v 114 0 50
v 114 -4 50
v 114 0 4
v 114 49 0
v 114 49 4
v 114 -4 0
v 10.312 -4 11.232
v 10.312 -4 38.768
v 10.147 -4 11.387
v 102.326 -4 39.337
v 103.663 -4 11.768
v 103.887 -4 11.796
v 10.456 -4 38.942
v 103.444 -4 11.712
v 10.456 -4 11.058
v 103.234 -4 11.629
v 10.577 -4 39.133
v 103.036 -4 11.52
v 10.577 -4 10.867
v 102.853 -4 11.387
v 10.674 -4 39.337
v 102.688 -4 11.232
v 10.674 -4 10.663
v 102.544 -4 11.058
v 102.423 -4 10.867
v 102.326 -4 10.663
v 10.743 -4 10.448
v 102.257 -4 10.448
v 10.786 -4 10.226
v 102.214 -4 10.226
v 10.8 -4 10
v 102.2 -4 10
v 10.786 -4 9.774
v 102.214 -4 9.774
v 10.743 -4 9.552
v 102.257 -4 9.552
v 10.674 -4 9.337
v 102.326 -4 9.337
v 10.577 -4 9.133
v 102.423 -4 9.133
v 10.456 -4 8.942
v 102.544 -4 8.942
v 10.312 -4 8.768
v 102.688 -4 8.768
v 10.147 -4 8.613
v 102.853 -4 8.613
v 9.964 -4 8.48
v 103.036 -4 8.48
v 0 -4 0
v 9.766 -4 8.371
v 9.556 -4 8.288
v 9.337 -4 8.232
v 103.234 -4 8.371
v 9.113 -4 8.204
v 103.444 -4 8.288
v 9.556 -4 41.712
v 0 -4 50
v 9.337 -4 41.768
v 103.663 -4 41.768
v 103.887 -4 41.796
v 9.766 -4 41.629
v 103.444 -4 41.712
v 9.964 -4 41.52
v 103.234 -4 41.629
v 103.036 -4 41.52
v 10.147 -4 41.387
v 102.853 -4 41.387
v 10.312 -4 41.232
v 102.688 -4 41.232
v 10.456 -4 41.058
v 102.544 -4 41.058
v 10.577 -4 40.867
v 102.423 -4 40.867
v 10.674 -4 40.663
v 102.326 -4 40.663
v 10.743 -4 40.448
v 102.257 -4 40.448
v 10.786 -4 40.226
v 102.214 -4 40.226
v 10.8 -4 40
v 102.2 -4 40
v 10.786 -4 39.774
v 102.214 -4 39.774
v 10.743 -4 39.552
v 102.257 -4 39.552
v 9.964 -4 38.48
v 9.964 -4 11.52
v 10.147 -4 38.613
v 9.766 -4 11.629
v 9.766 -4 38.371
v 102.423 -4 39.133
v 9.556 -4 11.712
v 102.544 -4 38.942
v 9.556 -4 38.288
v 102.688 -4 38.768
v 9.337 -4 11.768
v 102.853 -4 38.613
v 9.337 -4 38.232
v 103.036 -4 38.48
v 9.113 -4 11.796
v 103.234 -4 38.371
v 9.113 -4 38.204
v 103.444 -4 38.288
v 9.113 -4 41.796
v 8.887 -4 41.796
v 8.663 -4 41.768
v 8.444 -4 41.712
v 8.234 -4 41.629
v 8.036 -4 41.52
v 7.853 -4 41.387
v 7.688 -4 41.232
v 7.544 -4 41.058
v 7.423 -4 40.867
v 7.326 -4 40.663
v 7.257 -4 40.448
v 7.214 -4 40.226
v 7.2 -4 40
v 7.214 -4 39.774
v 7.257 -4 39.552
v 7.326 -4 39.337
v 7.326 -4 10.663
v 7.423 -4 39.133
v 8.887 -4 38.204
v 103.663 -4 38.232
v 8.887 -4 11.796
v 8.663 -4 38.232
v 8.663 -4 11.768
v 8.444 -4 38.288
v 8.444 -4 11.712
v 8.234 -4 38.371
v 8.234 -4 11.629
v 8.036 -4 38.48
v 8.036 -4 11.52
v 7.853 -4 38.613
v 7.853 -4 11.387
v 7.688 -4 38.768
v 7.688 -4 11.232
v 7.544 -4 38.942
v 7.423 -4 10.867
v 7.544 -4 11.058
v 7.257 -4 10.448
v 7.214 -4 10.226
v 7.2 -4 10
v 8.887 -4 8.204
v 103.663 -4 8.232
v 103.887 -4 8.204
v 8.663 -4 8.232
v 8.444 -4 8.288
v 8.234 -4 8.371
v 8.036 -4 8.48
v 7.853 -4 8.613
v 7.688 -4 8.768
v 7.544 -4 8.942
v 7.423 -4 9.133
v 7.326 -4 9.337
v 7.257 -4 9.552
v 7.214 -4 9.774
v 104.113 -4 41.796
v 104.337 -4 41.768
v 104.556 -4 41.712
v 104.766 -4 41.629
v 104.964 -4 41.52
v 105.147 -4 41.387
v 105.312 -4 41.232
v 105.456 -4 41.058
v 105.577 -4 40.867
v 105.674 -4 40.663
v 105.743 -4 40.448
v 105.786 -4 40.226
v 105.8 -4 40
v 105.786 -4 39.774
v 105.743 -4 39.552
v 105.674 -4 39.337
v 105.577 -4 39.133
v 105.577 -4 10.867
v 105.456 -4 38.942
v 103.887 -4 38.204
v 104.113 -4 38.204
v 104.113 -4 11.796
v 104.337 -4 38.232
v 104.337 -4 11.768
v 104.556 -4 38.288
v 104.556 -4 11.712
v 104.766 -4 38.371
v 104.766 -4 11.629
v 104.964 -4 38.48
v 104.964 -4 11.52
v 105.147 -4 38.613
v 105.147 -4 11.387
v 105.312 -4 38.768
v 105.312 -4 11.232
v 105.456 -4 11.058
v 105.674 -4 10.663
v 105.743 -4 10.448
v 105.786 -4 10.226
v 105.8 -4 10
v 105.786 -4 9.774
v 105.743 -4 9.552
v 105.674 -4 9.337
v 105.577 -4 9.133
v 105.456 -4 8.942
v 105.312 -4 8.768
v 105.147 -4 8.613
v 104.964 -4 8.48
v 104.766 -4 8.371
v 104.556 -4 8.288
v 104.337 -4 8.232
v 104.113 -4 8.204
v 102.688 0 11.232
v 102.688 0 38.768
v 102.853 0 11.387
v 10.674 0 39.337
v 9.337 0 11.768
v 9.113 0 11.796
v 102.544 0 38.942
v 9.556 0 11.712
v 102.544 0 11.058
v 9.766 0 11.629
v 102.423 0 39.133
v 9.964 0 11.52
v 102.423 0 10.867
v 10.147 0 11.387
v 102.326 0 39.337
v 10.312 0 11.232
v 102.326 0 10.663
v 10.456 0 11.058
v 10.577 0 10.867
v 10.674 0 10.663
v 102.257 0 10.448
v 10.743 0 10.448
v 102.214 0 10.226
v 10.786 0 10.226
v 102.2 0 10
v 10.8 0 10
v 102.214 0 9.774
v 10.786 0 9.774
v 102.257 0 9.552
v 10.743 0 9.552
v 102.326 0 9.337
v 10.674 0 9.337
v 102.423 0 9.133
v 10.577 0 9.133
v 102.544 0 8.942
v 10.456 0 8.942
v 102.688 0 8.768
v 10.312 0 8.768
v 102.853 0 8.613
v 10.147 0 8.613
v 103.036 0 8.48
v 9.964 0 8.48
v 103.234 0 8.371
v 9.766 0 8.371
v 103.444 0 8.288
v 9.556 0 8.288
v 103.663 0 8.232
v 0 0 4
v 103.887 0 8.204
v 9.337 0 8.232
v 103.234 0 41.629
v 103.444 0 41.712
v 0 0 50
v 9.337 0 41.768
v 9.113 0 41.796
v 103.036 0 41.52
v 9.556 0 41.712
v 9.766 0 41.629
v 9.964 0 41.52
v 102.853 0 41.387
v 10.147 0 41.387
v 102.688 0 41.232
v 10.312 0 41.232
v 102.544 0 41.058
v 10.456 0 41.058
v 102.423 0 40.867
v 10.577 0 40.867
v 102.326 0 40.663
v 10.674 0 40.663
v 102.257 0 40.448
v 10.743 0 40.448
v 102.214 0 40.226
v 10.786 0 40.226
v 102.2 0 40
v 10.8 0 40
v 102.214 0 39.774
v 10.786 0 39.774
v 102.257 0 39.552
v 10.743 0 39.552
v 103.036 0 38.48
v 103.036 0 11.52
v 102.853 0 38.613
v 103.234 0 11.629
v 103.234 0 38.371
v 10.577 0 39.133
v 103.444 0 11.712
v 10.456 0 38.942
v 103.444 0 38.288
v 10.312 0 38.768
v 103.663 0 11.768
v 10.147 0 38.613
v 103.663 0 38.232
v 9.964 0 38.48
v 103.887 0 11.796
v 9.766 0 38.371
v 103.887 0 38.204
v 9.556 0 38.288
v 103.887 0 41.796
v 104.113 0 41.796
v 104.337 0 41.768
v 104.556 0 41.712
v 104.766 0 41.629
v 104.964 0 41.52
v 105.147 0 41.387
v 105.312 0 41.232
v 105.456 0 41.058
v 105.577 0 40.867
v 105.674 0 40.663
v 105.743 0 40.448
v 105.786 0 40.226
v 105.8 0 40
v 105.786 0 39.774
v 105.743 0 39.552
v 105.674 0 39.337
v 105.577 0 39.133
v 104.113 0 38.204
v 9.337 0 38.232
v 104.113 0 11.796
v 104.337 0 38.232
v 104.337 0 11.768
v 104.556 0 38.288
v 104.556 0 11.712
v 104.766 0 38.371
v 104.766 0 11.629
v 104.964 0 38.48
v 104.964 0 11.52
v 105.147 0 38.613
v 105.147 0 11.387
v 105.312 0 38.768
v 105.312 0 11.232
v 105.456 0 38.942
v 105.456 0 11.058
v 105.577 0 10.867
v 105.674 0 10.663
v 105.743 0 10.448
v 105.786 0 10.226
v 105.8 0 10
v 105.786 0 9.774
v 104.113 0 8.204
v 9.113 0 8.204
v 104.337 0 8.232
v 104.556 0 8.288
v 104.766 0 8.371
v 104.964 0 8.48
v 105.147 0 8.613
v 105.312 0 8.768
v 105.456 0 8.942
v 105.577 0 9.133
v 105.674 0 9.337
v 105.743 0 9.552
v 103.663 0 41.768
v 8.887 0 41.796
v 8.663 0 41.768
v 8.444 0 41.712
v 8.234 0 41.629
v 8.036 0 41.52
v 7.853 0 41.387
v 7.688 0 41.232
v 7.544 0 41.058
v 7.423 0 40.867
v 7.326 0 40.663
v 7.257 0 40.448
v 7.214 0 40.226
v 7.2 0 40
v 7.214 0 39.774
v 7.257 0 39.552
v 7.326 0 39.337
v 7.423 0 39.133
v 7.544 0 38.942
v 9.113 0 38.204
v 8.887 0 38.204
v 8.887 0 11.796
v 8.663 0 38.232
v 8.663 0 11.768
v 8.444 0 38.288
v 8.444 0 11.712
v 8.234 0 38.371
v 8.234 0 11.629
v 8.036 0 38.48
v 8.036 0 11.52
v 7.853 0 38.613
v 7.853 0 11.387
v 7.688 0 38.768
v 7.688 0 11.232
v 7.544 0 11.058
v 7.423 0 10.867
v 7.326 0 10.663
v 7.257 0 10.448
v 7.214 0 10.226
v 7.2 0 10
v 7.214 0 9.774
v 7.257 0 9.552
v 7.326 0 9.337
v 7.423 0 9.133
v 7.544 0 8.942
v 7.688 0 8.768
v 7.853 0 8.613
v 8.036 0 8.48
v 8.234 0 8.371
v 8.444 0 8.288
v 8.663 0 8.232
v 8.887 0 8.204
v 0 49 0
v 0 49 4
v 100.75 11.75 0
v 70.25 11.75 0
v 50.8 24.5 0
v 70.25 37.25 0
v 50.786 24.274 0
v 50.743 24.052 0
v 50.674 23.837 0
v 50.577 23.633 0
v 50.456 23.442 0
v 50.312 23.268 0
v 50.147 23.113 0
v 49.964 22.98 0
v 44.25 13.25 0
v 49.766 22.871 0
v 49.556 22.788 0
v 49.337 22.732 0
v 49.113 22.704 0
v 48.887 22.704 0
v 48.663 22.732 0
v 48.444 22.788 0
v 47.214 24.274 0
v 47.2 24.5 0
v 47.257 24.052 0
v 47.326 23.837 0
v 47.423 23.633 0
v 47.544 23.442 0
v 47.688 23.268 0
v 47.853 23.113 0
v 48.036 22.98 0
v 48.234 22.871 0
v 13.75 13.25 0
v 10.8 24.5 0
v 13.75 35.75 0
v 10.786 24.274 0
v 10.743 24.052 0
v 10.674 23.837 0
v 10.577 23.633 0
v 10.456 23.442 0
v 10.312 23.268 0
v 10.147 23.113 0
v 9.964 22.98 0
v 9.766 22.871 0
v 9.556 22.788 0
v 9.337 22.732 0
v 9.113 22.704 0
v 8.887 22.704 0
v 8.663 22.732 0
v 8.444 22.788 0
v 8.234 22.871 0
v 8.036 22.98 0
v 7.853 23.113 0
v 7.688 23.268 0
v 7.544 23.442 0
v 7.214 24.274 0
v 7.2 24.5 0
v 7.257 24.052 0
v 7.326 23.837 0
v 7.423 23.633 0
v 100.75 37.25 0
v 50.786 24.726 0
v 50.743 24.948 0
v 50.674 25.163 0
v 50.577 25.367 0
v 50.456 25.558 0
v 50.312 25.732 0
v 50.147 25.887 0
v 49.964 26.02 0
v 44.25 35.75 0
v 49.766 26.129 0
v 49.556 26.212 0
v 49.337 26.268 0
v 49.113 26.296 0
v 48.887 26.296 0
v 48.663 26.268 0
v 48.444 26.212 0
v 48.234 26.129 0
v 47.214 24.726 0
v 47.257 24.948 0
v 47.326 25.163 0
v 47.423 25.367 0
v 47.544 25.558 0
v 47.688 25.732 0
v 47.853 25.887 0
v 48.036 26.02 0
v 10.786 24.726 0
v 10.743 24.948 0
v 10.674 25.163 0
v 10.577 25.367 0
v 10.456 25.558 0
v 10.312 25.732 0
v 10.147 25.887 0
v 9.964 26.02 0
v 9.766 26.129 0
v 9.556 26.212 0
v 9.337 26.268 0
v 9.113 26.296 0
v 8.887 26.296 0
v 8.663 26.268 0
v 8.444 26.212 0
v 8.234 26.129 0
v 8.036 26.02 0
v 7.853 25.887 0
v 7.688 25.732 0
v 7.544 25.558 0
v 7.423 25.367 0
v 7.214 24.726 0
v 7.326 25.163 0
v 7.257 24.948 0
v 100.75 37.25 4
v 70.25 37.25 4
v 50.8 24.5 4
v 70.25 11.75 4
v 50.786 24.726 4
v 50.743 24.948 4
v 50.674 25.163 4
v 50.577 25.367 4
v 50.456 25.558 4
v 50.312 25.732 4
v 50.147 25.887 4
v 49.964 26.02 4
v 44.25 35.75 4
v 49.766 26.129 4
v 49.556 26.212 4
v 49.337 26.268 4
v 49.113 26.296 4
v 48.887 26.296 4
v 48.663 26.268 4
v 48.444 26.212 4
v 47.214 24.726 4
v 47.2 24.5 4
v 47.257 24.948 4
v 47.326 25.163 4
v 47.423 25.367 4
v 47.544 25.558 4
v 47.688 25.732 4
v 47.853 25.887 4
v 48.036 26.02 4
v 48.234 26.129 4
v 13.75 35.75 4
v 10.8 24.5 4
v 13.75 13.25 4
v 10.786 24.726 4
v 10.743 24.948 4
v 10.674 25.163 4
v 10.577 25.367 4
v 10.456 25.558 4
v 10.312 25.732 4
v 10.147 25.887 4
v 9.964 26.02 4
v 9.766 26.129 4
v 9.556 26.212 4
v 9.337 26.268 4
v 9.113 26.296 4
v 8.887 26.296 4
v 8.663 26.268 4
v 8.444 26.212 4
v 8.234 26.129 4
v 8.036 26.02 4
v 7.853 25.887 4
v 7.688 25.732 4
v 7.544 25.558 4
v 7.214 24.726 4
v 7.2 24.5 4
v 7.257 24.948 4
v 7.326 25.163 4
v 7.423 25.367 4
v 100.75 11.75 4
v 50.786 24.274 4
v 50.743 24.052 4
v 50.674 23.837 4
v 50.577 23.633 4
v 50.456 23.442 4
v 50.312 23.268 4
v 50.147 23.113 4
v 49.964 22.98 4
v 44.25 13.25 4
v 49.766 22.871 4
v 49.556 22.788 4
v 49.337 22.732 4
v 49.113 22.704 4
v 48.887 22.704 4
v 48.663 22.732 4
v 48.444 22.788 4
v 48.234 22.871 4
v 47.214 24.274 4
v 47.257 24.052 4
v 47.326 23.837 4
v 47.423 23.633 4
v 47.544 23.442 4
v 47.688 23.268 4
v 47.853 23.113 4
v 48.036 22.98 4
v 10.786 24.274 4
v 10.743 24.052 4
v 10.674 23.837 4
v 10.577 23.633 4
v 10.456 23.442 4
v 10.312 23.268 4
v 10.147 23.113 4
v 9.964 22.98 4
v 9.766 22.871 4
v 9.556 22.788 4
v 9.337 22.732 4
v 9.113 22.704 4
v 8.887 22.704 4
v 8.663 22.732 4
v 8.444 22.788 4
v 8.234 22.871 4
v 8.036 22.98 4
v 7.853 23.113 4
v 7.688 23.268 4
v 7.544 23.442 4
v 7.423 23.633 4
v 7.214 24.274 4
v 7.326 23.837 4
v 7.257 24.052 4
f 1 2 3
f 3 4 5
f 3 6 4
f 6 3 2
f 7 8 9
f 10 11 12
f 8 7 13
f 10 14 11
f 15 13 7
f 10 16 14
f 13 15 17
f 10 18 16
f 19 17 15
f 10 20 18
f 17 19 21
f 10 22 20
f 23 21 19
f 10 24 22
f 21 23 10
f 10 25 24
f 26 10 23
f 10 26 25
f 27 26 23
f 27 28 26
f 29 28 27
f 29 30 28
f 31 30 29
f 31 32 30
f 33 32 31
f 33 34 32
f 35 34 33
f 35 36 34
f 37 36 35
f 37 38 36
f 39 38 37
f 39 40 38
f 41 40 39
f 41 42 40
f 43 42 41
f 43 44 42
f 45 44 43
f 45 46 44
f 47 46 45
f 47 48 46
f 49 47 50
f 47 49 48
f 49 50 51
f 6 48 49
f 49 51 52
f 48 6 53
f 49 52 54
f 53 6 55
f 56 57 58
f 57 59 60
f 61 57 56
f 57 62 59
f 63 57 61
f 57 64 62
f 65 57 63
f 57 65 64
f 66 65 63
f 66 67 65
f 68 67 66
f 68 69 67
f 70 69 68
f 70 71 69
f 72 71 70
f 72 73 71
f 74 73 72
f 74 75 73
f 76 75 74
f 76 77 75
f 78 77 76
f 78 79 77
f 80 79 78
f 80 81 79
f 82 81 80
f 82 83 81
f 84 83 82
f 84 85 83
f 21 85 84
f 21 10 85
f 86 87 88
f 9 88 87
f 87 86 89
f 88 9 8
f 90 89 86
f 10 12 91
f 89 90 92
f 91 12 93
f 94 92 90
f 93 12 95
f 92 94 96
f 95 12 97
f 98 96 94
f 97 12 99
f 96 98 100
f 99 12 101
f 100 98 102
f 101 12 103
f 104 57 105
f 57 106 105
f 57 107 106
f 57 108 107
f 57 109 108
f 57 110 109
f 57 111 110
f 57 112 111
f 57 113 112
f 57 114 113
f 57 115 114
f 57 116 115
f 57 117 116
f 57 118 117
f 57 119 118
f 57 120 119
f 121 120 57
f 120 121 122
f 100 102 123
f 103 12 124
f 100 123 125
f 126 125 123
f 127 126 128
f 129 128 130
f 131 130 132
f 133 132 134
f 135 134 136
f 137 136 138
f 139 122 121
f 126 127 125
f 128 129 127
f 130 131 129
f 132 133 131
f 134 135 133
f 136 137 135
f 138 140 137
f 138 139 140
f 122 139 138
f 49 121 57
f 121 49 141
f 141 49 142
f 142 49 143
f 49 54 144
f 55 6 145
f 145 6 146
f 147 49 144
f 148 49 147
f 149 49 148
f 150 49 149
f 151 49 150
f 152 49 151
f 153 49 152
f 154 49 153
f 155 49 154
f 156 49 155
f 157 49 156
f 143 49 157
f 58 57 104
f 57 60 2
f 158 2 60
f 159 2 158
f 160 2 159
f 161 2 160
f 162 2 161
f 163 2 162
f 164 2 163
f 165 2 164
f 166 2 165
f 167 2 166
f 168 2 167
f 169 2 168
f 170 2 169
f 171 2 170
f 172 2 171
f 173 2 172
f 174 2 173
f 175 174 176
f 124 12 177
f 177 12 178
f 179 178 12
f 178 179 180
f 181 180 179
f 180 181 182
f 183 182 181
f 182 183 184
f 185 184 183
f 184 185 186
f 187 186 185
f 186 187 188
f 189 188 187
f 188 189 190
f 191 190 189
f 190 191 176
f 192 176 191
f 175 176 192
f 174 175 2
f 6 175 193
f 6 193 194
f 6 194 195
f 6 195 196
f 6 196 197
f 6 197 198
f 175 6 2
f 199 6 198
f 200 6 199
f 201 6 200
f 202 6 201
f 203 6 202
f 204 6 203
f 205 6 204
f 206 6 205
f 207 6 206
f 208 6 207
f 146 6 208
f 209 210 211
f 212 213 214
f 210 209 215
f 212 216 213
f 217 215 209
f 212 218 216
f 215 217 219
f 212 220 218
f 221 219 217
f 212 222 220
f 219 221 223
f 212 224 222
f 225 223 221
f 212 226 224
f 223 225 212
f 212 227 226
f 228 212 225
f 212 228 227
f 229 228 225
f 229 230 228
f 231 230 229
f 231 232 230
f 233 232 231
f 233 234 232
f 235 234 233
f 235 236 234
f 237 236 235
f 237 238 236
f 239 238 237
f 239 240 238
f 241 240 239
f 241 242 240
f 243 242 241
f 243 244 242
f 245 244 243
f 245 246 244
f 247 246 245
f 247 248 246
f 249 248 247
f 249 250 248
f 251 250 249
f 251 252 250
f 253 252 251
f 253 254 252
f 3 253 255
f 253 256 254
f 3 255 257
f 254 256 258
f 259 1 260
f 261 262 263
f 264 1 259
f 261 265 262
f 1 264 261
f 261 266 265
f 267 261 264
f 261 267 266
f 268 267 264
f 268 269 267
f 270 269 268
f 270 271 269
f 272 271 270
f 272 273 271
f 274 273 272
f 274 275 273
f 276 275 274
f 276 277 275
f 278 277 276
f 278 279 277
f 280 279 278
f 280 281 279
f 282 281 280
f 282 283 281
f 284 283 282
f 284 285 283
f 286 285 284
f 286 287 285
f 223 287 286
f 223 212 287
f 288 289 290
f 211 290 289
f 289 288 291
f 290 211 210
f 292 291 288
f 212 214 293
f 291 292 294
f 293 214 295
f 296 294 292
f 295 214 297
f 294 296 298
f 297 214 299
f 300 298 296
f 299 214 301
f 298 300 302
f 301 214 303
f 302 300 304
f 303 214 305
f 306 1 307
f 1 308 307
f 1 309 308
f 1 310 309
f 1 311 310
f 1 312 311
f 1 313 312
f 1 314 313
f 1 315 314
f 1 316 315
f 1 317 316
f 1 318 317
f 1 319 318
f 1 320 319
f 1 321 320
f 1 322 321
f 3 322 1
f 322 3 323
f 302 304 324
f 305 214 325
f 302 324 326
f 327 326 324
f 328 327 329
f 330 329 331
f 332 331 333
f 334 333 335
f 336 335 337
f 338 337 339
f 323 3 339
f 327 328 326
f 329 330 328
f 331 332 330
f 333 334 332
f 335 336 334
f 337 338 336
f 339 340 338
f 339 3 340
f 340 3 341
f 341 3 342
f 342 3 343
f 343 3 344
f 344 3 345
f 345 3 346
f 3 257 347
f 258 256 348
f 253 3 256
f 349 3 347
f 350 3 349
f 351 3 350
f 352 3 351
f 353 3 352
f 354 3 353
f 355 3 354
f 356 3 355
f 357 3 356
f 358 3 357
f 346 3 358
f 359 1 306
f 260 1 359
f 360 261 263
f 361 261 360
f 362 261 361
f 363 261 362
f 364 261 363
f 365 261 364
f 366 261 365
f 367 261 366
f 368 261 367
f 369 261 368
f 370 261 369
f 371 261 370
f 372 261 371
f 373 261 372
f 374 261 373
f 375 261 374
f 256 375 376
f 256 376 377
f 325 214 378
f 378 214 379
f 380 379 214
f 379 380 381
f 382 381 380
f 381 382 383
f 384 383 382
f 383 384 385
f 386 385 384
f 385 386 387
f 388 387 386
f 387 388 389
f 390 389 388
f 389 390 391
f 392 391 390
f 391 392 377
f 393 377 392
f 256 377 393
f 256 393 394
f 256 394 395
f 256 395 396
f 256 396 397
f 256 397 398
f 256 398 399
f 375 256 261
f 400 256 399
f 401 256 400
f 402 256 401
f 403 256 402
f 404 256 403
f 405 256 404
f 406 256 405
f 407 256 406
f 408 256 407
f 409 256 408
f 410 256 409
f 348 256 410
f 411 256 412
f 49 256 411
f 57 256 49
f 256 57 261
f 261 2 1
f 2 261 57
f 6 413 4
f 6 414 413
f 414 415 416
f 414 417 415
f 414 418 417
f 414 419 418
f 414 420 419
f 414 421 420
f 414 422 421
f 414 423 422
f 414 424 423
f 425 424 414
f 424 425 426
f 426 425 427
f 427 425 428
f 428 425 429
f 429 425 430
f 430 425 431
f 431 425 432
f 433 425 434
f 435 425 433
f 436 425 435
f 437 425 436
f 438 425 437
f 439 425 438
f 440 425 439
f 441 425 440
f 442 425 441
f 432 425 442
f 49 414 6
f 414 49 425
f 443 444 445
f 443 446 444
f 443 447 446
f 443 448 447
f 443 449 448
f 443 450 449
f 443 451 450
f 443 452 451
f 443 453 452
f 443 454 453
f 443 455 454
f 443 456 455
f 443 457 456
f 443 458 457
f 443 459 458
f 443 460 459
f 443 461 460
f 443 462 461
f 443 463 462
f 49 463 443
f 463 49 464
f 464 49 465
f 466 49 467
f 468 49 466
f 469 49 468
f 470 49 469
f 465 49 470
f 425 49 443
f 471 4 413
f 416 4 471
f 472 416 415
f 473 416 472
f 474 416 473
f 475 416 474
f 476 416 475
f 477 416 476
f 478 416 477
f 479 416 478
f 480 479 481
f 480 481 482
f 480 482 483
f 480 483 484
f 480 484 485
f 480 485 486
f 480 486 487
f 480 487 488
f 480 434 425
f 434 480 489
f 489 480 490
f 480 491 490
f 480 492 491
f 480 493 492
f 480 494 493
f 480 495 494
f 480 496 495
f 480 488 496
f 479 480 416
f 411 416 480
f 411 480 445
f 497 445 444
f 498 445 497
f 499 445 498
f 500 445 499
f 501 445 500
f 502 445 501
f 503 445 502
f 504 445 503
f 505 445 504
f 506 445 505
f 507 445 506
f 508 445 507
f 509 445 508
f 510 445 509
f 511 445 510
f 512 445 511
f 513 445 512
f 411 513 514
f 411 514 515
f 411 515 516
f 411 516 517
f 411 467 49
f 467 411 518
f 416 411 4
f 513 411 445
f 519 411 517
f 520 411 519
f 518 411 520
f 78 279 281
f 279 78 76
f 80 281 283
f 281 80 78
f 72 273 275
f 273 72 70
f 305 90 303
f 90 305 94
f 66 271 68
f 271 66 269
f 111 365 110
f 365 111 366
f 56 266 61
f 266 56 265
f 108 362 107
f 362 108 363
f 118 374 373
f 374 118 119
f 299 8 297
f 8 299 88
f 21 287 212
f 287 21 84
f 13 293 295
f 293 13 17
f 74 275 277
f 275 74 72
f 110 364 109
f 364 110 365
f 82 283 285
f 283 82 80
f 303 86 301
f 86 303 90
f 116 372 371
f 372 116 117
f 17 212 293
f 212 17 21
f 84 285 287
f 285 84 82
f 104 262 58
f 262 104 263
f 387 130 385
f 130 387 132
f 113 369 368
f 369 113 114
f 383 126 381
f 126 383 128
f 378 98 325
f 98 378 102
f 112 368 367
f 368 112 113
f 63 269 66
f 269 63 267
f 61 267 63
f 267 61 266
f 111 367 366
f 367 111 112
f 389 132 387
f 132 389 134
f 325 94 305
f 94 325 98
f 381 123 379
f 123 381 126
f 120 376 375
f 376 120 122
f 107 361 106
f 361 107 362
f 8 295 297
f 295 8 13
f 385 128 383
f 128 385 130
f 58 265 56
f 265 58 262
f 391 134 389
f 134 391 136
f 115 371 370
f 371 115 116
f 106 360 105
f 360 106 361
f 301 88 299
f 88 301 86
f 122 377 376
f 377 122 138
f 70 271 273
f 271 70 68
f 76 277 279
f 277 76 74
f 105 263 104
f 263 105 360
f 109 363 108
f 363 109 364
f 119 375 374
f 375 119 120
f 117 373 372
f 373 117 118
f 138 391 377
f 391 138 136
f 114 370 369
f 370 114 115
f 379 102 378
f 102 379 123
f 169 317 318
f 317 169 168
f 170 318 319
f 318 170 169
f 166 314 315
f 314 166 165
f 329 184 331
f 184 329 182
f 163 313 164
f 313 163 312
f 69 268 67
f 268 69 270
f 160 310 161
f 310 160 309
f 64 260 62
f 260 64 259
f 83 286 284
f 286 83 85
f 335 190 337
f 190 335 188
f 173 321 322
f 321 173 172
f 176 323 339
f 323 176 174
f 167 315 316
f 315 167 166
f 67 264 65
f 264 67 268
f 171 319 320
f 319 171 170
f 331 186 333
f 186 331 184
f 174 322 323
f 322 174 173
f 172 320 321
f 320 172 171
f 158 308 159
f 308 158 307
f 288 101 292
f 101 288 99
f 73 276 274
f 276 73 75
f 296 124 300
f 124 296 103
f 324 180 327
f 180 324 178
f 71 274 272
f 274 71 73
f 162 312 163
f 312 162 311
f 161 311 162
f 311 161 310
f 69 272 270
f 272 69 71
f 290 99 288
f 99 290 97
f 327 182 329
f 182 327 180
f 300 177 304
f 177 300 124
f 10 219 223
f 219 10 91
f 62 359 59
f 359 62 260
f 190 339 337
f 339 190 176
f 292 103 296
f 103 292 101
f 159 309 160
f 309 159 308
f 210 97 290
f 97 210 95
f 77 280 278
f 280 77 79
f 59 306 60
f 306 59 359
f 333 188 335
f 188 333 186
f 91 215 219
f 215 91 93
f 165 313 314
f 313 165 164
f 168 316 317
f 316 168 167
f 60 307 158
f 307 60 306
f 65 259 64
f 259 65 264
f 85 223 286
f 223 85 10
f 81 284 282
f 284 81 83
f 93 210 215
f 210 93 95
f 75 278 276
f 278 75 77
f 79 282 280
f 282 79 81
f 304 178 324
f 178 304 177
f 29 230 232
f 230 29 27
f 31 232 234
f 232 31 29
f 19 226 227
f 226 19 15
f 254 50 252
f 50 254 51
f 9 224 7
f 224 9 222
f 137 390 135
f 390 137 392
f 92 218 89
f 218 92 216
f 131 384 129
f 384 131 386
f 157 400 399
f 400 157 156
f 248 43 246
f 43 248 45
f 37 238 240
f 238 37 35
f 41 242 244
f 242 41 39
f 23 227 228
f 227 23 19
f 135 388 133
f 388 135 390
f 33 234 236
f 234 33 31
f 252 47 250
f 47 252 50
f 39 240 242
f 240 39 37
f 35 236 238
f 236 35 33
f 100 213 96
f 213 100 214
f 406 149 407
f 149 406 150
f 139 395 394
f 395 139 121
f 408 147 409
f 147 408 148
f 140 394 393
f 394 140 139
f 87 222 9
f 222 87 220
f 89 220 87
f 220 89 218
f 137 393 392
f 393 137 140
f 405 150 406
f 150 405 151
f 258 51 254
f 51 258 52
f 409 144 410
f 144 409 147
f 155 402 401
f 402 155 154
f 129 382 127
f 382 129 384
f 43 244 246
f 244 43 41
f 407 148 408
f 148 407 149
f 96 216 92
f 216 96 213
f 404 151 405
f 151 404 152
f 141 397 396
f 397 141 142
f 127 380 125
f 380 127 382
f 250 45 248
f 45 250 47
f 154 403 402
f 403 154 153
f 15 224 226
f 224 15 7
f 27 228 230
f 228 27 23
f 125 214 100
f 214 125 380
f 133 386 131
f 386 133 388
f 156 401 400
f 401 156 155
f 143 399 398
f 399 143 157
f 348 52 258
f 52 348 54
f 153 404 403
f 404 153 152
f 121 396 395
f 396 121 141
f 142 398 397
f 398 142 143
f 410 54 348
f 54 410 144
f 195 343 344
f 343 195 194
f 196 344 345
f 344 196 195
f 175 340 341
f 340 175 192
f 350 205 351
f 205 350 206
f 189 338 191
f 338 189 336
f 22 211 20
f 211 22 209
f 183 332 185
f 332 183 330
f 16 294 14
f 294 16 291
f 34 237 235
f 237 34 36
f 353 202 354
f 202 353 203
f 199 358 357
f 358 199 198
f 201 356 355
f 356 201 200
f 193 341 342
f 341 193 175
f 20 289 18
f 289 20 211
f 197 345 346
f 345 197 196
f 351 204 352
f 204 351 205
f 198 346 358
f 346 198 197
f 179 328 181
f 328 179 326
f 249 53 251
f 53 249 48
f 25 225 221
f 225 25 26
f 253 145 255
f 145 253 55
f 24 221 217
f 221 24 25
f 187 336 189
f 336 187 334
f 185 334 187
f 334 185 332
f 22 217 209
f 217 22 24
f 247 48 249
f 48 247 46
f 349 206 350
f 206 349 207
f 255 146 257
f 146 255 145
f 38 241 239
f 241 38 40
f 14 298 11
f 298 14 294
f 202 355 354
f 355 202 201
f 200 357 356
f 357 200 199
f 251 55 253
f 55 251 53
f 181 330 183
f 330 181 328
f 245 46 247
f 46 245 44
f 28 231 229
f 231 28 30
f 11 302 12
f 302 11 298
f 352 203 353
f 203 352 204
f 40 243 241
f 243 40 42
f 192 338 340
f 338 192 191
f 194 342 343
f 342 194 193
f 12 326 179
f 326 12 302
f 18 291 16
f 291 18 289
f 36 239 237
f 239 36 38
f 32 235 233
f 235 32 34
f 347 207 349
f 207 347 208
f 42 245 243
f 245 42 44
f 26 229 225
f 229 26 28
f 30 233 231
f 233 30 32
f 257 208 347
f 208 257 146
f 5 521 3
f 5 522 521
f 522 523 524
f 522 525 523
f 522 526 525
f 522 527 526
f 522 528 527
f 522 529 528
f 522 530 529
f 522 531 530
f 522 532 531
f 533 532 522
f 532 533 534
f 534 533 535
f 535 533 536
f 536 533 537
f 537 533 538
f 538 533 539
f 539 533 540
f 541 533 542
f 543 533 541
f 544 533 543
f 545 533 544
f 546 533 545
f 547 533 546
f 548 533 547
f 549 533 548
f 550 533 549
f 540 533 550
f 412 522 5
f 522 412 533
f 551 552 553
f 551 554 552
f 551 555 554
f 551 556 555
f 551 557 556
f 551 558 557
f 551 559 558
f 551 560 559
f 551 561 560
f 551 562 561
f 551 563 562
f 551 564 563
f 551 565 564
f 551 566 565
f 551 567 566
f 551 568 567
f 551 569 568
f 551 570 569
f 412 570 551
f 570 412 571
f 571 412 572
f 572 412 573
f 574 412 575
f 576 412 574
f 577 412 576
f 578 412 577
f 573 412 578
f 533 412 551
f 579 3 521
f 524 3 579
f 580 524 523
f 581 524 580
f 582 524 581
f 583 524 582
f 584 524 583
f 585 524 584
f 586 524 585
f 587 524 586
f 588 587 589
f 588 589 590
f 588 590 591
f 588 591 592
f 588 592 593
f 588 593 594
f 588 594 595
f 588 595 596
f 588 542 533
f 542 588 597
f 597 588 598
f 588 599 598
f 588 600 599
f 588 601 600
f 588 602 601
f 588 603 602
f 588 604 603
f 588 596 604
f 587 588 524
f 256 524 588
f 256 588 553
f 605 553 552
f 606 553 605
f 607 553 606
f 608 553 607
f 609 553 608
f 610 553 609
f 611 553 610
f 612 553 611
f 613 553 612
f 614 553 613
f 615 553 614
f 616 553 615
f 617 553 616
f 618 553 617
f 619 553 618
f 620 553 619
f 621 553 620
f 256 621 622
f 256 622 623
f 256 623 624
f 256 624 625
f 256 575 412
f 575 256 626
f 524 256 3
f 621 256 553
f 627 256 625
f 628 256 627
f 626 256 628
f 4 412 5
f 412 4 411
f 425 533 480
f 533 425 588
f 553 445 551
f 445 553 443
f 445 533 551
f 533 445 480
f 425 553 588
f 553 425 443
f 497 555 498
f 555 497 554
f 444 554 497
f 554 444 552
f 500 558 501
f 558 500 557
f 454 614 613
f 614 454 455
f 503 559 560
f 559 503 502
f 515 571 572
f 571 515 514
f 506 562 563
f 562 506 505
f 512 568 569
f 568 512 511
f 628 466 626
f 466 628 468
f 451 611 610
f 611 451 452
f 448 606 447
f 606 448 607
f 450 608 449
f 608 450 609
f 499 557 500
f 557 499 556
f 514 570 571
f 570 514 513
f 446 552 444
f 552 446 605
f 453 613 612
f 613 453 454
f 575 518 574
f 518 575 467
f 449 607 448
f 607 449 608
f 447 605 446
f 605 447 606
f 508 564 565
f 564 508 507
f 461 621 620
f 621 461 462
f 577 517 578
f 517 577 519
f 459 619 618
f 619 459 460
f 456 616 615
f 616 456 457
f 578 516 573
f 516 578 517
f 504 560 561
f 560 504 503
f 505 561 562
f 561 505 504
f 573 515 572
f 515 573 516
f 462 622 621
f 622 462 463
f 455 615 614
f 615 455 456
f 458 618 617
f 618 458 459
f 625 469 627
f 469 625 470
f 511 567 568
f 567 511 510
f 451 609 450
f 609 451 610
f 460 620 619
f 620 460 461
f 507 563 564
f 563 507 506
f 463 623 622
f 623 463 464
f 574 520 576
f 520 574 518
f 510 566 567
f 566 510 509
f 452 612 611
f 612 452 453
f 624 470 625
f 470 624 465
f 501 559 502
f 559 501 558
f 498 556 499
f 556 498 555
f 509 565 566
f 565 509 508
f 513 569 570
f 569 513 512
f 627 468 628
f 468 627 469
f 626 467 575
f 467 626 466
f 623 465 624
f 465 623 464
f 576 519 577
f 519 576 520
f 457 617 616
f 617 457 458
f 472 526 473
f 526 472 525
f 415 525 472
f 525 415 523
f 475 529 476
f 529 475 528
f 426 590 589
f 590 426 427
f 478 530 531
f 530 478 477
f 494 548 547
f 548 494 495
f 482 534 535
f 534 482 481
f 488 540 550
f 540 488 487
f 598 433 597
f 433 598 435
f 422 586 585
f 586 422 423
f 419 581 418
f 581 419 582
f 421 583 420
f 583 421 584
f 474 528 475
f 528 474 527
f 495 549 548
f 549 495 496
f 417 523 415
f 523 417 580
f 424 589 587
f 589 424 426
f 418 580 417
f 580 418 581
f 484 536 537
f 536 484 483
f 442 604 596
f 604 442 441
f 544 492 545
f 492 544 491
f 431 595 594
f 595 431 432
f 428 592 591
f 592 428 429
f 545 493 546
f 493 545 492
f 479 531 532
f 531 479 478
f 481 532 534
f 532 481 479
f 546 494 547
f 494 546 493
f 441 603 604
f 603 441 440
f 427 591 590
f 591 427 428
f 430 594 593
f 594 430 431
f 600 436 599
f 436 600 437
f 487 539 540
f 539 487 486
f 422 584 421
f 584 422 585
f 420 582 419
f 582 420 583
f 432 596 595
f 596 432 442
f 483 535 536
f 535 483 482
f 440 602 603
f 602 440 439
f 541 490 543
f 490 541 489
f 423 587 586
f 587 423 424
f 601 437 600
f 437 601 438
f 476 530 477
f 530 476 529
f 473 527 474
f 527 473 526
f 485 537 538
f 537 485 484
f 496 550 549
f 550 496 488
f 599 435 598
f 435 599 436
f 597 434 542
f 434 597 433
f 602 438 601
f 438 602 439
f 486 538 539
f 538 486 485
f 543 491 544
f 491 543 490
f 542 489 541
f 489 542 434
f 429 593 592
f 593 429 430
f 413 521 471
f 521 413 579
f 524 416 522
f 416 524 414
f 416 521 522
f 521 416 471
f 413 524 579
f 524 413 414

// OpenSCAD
// iTopie RepRap - Main file
//
// @version 1.1.0
// @license GPLv3
// @docs    http://reprap.org/wiki/ITopie  
// @sources https://github.com/lautr3k/RepRap-iTopie 
// @author  Sébastien Mischler <skarab>
// @author  http://www.onlfait.ch
//
// @upddate 2015-06-27 <skarab> first write
// @update  2015-07-02 <skarab> add: vertical plate
// @upddate 2015-07-03 <skarab> add: feet
include <config.scad>

psu_width                  = 114;                        // width of PSU
psu_height                 = 49;                         // height of PSU
psu_socket_hole_width      = 30.5;                       // width of PSU socket hole
psu_socket_hole_height     = 22.5;                       // height of PSU socket hole
psu_socket_mount_spacing   = 40;                         // distance between holes for socket mount bolts
psu_socket_mount_hole_r    = m3_screw_radius*1.2;            // radius of socket mount holes
psu_switch_hole_width      = 30.5;                       // width of PSU socket hole
psu_switch_hole_height     = 25.5;                       // height of PSU socket hole
psu_mount_top_hole_margin  = 9;                          // distance from side of plastic PSU socket and switch mount to top mounting hole
psu_mount_thickness = 4;                                 // thickness of plastic PSU socket and switch mount

rotate([90,0,0])
difference(){
    cube([psu_width,psu_socket_mount_hole_x_spacing + 20,psu_mount_thickness]);
    translate([psu_mount_top_hole_margin, psu_socket_mount_hole_x_spacing + 10, 0]) cylinder(h=psu_mount_thickness,r=psu_socket_mount_hole_r);
    translate([psu_mount_top_hole_margin + psu_mount_holes_spacing_y, psu_socket_mount_hole_x_spacing + 10, 0]) cylinder(h=psu_mount_thickness,r=psu_socket_mount_hole_r);
    translate([psu_mount_top_hole_margin, 10, 0]) cylinder(h=psu_mount_thickness,r=psu_socket_mount_hole_r);
    translate([psu_mount_top_hole_margin + psu_mount_holes_spacing_y, 10, 0]) cylinder(h=psu_mount_thickness,r=psu_socket_mount_hole_r);
};

difference(){
    cube([psu_width,psu_height,psu_mount_thickness]);
    translate([psu_mount_top_hole_margin + psu_socket_mount_spacing/2,psu_height/2,0])
    cube([psu_socket_hole_width,psu_socket_hole_height,psu_mount_thickness*2],center=true);
    translate([psu_mount_top_hole_margin,psu_height/2,0]) cylinder(h=psu_mount_thickness,r=psu_socket_mount_hole_r);
    translate([psu_mount_top_hole_margin + psu_socket_mount_spacing,psu_height/2,0]) cylinder(h=psu_mount_thickness,r=psu_socket_mount_hole_r);
    translate([3*psu_width/4,psu_height/2,0])
    cube([psu_switch_hole_width,psu_switch_hole_height,psu_mount_thickness*2],center=true);
};
